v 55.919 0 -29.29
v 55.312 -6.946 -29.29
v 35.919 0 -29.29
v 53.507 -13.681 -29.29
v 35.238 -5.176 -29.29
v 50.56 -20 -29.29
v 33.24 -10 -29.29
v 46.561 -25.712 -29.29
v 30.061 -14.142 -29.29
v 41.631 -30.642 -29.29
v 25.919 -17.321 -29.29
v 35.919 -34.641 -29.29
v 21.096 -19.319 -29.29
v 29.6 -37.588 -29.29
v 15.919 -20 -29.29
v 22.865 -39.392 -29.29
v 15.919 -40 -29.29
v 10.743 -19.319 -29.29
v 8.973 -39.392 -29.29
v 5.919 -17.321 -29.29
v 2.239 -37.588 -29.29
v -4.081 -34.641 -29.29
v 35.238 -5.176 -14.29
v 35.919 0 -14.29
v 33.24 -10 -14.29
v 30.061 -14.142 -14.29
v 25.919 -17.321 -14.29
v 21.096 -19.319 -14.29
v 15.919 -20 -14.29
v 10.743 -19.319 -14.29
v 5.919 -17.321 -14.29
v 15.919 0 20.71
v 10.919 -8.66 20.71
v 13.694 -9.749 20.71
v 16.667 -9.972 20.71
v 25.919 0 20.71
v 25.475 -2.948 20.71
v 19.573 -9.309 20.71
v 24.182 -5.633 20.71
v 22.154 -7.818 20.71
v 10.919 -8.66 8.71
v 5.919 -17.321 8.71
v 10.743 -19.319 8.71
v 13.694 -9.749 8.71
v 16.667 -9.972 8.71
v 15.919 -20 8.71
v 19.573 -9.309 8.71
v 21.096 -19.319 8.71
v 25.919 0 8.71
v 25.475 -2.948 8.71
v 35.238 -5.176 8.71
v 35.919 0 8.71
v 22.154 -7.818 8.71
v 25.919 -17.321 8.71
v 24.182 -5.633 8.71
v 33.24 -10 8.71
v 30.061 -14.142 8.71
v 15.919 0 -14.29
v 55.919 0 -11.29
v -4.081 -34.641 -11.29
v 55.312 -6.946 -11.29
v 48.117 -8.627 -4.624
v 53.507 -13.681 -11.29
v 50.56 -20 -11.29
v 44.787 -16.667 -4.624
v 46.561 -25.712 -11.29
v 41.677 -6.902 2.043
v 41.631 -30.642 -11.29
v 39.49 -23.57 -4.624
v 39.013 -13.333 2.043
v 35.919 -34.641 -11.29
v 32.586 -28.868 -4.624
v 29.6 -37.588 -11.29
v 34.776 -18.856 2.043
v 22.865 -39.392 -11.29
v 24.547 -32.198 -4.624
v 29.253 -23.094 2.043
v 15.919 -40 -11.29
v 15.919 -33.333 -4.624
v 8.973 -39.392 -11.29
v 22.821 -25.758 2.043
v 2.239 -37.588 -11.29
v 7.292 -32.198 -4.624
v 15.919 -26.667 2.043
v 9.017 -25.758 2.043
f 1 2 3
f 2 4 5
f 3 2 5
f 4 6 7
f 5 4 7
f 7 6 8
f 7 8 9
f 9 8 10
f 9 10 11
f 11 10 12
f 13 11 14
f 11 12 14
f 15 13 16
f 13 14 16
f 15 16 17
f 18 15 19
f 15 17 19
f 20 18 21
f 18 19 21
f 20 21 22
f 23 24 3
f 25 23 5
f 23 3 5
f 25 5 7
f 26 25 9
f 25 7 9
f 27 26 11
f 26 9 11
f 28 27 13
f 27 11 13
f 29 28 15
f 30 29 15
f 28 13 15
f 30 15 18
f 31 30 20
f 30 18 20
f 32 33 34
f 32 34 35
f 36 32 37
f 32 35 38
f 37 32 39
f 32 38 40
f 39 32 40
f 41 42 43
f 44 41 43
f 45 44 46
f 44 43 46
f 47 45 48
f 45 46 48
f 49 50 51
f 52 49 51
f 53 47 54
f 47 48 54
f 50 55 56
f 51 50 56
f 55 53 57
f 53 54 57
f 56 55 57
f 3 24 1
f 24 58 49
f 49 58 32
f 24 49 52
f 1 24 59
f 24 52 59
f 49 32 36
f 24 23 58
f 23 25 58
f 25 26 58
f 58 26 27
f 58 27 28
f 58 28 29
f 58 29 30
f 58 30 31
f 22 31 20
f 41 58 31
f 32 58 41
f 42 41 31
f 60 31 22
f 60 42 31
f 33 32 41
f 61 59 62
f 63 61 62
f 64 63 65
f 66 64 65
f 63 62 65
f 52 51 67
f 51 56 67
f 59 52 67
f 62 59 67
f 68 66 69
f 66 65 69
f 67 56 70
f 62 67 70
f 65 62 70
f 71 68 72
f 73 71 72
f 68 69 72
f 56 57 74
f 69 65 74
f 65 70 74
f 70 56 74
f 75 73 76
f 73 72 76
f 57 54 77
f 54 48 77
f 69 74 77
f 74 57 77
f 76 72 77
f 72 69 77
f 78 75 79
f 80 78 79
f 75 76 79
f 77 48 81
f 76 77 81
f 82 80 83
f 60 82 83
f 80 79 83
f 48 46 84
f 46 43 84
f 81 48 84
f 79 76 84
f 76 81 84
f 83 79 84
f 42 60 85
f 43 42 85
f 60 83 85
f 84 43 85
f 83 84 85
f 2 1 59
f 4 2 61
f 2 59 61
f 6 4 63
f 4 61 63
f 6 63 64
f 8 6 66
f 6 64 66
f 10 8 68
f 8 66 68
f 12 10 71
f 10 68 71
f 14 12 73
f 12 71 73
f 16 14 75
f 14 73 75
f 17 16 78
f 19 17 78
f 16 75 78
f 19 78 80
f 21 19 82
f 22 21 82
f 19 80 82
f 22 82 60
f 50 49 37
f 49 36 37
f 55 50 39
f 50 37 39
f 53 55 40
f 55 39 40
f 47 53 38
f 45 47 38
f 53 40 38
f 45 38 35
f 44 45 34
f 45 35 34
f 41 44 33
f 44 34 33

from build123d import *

# Parameters (mm, degrees)
F1_ANGLE = 120


with BuildPart() as f1:
    # F0 (on Front) → F1 (revolve)
    with BuildSketch(Plane.XZ):
        Polygon((25.919337, 20.709641), (15.919337, 20.709641), (15.919337, -14.290359), (35.919337, -14.290359), (35.919337, -29.290359), (55.919337, -29.290359), (55.919337, -11.290359), (35.919337, 8.709641), (25.919337, 8.709641), align=None)
    revolve(axis=Axis((15.919337, 0, 3.209641), (0, 0, -1)), revolution_arc=F1_ANGLE)


solid = f1.part
